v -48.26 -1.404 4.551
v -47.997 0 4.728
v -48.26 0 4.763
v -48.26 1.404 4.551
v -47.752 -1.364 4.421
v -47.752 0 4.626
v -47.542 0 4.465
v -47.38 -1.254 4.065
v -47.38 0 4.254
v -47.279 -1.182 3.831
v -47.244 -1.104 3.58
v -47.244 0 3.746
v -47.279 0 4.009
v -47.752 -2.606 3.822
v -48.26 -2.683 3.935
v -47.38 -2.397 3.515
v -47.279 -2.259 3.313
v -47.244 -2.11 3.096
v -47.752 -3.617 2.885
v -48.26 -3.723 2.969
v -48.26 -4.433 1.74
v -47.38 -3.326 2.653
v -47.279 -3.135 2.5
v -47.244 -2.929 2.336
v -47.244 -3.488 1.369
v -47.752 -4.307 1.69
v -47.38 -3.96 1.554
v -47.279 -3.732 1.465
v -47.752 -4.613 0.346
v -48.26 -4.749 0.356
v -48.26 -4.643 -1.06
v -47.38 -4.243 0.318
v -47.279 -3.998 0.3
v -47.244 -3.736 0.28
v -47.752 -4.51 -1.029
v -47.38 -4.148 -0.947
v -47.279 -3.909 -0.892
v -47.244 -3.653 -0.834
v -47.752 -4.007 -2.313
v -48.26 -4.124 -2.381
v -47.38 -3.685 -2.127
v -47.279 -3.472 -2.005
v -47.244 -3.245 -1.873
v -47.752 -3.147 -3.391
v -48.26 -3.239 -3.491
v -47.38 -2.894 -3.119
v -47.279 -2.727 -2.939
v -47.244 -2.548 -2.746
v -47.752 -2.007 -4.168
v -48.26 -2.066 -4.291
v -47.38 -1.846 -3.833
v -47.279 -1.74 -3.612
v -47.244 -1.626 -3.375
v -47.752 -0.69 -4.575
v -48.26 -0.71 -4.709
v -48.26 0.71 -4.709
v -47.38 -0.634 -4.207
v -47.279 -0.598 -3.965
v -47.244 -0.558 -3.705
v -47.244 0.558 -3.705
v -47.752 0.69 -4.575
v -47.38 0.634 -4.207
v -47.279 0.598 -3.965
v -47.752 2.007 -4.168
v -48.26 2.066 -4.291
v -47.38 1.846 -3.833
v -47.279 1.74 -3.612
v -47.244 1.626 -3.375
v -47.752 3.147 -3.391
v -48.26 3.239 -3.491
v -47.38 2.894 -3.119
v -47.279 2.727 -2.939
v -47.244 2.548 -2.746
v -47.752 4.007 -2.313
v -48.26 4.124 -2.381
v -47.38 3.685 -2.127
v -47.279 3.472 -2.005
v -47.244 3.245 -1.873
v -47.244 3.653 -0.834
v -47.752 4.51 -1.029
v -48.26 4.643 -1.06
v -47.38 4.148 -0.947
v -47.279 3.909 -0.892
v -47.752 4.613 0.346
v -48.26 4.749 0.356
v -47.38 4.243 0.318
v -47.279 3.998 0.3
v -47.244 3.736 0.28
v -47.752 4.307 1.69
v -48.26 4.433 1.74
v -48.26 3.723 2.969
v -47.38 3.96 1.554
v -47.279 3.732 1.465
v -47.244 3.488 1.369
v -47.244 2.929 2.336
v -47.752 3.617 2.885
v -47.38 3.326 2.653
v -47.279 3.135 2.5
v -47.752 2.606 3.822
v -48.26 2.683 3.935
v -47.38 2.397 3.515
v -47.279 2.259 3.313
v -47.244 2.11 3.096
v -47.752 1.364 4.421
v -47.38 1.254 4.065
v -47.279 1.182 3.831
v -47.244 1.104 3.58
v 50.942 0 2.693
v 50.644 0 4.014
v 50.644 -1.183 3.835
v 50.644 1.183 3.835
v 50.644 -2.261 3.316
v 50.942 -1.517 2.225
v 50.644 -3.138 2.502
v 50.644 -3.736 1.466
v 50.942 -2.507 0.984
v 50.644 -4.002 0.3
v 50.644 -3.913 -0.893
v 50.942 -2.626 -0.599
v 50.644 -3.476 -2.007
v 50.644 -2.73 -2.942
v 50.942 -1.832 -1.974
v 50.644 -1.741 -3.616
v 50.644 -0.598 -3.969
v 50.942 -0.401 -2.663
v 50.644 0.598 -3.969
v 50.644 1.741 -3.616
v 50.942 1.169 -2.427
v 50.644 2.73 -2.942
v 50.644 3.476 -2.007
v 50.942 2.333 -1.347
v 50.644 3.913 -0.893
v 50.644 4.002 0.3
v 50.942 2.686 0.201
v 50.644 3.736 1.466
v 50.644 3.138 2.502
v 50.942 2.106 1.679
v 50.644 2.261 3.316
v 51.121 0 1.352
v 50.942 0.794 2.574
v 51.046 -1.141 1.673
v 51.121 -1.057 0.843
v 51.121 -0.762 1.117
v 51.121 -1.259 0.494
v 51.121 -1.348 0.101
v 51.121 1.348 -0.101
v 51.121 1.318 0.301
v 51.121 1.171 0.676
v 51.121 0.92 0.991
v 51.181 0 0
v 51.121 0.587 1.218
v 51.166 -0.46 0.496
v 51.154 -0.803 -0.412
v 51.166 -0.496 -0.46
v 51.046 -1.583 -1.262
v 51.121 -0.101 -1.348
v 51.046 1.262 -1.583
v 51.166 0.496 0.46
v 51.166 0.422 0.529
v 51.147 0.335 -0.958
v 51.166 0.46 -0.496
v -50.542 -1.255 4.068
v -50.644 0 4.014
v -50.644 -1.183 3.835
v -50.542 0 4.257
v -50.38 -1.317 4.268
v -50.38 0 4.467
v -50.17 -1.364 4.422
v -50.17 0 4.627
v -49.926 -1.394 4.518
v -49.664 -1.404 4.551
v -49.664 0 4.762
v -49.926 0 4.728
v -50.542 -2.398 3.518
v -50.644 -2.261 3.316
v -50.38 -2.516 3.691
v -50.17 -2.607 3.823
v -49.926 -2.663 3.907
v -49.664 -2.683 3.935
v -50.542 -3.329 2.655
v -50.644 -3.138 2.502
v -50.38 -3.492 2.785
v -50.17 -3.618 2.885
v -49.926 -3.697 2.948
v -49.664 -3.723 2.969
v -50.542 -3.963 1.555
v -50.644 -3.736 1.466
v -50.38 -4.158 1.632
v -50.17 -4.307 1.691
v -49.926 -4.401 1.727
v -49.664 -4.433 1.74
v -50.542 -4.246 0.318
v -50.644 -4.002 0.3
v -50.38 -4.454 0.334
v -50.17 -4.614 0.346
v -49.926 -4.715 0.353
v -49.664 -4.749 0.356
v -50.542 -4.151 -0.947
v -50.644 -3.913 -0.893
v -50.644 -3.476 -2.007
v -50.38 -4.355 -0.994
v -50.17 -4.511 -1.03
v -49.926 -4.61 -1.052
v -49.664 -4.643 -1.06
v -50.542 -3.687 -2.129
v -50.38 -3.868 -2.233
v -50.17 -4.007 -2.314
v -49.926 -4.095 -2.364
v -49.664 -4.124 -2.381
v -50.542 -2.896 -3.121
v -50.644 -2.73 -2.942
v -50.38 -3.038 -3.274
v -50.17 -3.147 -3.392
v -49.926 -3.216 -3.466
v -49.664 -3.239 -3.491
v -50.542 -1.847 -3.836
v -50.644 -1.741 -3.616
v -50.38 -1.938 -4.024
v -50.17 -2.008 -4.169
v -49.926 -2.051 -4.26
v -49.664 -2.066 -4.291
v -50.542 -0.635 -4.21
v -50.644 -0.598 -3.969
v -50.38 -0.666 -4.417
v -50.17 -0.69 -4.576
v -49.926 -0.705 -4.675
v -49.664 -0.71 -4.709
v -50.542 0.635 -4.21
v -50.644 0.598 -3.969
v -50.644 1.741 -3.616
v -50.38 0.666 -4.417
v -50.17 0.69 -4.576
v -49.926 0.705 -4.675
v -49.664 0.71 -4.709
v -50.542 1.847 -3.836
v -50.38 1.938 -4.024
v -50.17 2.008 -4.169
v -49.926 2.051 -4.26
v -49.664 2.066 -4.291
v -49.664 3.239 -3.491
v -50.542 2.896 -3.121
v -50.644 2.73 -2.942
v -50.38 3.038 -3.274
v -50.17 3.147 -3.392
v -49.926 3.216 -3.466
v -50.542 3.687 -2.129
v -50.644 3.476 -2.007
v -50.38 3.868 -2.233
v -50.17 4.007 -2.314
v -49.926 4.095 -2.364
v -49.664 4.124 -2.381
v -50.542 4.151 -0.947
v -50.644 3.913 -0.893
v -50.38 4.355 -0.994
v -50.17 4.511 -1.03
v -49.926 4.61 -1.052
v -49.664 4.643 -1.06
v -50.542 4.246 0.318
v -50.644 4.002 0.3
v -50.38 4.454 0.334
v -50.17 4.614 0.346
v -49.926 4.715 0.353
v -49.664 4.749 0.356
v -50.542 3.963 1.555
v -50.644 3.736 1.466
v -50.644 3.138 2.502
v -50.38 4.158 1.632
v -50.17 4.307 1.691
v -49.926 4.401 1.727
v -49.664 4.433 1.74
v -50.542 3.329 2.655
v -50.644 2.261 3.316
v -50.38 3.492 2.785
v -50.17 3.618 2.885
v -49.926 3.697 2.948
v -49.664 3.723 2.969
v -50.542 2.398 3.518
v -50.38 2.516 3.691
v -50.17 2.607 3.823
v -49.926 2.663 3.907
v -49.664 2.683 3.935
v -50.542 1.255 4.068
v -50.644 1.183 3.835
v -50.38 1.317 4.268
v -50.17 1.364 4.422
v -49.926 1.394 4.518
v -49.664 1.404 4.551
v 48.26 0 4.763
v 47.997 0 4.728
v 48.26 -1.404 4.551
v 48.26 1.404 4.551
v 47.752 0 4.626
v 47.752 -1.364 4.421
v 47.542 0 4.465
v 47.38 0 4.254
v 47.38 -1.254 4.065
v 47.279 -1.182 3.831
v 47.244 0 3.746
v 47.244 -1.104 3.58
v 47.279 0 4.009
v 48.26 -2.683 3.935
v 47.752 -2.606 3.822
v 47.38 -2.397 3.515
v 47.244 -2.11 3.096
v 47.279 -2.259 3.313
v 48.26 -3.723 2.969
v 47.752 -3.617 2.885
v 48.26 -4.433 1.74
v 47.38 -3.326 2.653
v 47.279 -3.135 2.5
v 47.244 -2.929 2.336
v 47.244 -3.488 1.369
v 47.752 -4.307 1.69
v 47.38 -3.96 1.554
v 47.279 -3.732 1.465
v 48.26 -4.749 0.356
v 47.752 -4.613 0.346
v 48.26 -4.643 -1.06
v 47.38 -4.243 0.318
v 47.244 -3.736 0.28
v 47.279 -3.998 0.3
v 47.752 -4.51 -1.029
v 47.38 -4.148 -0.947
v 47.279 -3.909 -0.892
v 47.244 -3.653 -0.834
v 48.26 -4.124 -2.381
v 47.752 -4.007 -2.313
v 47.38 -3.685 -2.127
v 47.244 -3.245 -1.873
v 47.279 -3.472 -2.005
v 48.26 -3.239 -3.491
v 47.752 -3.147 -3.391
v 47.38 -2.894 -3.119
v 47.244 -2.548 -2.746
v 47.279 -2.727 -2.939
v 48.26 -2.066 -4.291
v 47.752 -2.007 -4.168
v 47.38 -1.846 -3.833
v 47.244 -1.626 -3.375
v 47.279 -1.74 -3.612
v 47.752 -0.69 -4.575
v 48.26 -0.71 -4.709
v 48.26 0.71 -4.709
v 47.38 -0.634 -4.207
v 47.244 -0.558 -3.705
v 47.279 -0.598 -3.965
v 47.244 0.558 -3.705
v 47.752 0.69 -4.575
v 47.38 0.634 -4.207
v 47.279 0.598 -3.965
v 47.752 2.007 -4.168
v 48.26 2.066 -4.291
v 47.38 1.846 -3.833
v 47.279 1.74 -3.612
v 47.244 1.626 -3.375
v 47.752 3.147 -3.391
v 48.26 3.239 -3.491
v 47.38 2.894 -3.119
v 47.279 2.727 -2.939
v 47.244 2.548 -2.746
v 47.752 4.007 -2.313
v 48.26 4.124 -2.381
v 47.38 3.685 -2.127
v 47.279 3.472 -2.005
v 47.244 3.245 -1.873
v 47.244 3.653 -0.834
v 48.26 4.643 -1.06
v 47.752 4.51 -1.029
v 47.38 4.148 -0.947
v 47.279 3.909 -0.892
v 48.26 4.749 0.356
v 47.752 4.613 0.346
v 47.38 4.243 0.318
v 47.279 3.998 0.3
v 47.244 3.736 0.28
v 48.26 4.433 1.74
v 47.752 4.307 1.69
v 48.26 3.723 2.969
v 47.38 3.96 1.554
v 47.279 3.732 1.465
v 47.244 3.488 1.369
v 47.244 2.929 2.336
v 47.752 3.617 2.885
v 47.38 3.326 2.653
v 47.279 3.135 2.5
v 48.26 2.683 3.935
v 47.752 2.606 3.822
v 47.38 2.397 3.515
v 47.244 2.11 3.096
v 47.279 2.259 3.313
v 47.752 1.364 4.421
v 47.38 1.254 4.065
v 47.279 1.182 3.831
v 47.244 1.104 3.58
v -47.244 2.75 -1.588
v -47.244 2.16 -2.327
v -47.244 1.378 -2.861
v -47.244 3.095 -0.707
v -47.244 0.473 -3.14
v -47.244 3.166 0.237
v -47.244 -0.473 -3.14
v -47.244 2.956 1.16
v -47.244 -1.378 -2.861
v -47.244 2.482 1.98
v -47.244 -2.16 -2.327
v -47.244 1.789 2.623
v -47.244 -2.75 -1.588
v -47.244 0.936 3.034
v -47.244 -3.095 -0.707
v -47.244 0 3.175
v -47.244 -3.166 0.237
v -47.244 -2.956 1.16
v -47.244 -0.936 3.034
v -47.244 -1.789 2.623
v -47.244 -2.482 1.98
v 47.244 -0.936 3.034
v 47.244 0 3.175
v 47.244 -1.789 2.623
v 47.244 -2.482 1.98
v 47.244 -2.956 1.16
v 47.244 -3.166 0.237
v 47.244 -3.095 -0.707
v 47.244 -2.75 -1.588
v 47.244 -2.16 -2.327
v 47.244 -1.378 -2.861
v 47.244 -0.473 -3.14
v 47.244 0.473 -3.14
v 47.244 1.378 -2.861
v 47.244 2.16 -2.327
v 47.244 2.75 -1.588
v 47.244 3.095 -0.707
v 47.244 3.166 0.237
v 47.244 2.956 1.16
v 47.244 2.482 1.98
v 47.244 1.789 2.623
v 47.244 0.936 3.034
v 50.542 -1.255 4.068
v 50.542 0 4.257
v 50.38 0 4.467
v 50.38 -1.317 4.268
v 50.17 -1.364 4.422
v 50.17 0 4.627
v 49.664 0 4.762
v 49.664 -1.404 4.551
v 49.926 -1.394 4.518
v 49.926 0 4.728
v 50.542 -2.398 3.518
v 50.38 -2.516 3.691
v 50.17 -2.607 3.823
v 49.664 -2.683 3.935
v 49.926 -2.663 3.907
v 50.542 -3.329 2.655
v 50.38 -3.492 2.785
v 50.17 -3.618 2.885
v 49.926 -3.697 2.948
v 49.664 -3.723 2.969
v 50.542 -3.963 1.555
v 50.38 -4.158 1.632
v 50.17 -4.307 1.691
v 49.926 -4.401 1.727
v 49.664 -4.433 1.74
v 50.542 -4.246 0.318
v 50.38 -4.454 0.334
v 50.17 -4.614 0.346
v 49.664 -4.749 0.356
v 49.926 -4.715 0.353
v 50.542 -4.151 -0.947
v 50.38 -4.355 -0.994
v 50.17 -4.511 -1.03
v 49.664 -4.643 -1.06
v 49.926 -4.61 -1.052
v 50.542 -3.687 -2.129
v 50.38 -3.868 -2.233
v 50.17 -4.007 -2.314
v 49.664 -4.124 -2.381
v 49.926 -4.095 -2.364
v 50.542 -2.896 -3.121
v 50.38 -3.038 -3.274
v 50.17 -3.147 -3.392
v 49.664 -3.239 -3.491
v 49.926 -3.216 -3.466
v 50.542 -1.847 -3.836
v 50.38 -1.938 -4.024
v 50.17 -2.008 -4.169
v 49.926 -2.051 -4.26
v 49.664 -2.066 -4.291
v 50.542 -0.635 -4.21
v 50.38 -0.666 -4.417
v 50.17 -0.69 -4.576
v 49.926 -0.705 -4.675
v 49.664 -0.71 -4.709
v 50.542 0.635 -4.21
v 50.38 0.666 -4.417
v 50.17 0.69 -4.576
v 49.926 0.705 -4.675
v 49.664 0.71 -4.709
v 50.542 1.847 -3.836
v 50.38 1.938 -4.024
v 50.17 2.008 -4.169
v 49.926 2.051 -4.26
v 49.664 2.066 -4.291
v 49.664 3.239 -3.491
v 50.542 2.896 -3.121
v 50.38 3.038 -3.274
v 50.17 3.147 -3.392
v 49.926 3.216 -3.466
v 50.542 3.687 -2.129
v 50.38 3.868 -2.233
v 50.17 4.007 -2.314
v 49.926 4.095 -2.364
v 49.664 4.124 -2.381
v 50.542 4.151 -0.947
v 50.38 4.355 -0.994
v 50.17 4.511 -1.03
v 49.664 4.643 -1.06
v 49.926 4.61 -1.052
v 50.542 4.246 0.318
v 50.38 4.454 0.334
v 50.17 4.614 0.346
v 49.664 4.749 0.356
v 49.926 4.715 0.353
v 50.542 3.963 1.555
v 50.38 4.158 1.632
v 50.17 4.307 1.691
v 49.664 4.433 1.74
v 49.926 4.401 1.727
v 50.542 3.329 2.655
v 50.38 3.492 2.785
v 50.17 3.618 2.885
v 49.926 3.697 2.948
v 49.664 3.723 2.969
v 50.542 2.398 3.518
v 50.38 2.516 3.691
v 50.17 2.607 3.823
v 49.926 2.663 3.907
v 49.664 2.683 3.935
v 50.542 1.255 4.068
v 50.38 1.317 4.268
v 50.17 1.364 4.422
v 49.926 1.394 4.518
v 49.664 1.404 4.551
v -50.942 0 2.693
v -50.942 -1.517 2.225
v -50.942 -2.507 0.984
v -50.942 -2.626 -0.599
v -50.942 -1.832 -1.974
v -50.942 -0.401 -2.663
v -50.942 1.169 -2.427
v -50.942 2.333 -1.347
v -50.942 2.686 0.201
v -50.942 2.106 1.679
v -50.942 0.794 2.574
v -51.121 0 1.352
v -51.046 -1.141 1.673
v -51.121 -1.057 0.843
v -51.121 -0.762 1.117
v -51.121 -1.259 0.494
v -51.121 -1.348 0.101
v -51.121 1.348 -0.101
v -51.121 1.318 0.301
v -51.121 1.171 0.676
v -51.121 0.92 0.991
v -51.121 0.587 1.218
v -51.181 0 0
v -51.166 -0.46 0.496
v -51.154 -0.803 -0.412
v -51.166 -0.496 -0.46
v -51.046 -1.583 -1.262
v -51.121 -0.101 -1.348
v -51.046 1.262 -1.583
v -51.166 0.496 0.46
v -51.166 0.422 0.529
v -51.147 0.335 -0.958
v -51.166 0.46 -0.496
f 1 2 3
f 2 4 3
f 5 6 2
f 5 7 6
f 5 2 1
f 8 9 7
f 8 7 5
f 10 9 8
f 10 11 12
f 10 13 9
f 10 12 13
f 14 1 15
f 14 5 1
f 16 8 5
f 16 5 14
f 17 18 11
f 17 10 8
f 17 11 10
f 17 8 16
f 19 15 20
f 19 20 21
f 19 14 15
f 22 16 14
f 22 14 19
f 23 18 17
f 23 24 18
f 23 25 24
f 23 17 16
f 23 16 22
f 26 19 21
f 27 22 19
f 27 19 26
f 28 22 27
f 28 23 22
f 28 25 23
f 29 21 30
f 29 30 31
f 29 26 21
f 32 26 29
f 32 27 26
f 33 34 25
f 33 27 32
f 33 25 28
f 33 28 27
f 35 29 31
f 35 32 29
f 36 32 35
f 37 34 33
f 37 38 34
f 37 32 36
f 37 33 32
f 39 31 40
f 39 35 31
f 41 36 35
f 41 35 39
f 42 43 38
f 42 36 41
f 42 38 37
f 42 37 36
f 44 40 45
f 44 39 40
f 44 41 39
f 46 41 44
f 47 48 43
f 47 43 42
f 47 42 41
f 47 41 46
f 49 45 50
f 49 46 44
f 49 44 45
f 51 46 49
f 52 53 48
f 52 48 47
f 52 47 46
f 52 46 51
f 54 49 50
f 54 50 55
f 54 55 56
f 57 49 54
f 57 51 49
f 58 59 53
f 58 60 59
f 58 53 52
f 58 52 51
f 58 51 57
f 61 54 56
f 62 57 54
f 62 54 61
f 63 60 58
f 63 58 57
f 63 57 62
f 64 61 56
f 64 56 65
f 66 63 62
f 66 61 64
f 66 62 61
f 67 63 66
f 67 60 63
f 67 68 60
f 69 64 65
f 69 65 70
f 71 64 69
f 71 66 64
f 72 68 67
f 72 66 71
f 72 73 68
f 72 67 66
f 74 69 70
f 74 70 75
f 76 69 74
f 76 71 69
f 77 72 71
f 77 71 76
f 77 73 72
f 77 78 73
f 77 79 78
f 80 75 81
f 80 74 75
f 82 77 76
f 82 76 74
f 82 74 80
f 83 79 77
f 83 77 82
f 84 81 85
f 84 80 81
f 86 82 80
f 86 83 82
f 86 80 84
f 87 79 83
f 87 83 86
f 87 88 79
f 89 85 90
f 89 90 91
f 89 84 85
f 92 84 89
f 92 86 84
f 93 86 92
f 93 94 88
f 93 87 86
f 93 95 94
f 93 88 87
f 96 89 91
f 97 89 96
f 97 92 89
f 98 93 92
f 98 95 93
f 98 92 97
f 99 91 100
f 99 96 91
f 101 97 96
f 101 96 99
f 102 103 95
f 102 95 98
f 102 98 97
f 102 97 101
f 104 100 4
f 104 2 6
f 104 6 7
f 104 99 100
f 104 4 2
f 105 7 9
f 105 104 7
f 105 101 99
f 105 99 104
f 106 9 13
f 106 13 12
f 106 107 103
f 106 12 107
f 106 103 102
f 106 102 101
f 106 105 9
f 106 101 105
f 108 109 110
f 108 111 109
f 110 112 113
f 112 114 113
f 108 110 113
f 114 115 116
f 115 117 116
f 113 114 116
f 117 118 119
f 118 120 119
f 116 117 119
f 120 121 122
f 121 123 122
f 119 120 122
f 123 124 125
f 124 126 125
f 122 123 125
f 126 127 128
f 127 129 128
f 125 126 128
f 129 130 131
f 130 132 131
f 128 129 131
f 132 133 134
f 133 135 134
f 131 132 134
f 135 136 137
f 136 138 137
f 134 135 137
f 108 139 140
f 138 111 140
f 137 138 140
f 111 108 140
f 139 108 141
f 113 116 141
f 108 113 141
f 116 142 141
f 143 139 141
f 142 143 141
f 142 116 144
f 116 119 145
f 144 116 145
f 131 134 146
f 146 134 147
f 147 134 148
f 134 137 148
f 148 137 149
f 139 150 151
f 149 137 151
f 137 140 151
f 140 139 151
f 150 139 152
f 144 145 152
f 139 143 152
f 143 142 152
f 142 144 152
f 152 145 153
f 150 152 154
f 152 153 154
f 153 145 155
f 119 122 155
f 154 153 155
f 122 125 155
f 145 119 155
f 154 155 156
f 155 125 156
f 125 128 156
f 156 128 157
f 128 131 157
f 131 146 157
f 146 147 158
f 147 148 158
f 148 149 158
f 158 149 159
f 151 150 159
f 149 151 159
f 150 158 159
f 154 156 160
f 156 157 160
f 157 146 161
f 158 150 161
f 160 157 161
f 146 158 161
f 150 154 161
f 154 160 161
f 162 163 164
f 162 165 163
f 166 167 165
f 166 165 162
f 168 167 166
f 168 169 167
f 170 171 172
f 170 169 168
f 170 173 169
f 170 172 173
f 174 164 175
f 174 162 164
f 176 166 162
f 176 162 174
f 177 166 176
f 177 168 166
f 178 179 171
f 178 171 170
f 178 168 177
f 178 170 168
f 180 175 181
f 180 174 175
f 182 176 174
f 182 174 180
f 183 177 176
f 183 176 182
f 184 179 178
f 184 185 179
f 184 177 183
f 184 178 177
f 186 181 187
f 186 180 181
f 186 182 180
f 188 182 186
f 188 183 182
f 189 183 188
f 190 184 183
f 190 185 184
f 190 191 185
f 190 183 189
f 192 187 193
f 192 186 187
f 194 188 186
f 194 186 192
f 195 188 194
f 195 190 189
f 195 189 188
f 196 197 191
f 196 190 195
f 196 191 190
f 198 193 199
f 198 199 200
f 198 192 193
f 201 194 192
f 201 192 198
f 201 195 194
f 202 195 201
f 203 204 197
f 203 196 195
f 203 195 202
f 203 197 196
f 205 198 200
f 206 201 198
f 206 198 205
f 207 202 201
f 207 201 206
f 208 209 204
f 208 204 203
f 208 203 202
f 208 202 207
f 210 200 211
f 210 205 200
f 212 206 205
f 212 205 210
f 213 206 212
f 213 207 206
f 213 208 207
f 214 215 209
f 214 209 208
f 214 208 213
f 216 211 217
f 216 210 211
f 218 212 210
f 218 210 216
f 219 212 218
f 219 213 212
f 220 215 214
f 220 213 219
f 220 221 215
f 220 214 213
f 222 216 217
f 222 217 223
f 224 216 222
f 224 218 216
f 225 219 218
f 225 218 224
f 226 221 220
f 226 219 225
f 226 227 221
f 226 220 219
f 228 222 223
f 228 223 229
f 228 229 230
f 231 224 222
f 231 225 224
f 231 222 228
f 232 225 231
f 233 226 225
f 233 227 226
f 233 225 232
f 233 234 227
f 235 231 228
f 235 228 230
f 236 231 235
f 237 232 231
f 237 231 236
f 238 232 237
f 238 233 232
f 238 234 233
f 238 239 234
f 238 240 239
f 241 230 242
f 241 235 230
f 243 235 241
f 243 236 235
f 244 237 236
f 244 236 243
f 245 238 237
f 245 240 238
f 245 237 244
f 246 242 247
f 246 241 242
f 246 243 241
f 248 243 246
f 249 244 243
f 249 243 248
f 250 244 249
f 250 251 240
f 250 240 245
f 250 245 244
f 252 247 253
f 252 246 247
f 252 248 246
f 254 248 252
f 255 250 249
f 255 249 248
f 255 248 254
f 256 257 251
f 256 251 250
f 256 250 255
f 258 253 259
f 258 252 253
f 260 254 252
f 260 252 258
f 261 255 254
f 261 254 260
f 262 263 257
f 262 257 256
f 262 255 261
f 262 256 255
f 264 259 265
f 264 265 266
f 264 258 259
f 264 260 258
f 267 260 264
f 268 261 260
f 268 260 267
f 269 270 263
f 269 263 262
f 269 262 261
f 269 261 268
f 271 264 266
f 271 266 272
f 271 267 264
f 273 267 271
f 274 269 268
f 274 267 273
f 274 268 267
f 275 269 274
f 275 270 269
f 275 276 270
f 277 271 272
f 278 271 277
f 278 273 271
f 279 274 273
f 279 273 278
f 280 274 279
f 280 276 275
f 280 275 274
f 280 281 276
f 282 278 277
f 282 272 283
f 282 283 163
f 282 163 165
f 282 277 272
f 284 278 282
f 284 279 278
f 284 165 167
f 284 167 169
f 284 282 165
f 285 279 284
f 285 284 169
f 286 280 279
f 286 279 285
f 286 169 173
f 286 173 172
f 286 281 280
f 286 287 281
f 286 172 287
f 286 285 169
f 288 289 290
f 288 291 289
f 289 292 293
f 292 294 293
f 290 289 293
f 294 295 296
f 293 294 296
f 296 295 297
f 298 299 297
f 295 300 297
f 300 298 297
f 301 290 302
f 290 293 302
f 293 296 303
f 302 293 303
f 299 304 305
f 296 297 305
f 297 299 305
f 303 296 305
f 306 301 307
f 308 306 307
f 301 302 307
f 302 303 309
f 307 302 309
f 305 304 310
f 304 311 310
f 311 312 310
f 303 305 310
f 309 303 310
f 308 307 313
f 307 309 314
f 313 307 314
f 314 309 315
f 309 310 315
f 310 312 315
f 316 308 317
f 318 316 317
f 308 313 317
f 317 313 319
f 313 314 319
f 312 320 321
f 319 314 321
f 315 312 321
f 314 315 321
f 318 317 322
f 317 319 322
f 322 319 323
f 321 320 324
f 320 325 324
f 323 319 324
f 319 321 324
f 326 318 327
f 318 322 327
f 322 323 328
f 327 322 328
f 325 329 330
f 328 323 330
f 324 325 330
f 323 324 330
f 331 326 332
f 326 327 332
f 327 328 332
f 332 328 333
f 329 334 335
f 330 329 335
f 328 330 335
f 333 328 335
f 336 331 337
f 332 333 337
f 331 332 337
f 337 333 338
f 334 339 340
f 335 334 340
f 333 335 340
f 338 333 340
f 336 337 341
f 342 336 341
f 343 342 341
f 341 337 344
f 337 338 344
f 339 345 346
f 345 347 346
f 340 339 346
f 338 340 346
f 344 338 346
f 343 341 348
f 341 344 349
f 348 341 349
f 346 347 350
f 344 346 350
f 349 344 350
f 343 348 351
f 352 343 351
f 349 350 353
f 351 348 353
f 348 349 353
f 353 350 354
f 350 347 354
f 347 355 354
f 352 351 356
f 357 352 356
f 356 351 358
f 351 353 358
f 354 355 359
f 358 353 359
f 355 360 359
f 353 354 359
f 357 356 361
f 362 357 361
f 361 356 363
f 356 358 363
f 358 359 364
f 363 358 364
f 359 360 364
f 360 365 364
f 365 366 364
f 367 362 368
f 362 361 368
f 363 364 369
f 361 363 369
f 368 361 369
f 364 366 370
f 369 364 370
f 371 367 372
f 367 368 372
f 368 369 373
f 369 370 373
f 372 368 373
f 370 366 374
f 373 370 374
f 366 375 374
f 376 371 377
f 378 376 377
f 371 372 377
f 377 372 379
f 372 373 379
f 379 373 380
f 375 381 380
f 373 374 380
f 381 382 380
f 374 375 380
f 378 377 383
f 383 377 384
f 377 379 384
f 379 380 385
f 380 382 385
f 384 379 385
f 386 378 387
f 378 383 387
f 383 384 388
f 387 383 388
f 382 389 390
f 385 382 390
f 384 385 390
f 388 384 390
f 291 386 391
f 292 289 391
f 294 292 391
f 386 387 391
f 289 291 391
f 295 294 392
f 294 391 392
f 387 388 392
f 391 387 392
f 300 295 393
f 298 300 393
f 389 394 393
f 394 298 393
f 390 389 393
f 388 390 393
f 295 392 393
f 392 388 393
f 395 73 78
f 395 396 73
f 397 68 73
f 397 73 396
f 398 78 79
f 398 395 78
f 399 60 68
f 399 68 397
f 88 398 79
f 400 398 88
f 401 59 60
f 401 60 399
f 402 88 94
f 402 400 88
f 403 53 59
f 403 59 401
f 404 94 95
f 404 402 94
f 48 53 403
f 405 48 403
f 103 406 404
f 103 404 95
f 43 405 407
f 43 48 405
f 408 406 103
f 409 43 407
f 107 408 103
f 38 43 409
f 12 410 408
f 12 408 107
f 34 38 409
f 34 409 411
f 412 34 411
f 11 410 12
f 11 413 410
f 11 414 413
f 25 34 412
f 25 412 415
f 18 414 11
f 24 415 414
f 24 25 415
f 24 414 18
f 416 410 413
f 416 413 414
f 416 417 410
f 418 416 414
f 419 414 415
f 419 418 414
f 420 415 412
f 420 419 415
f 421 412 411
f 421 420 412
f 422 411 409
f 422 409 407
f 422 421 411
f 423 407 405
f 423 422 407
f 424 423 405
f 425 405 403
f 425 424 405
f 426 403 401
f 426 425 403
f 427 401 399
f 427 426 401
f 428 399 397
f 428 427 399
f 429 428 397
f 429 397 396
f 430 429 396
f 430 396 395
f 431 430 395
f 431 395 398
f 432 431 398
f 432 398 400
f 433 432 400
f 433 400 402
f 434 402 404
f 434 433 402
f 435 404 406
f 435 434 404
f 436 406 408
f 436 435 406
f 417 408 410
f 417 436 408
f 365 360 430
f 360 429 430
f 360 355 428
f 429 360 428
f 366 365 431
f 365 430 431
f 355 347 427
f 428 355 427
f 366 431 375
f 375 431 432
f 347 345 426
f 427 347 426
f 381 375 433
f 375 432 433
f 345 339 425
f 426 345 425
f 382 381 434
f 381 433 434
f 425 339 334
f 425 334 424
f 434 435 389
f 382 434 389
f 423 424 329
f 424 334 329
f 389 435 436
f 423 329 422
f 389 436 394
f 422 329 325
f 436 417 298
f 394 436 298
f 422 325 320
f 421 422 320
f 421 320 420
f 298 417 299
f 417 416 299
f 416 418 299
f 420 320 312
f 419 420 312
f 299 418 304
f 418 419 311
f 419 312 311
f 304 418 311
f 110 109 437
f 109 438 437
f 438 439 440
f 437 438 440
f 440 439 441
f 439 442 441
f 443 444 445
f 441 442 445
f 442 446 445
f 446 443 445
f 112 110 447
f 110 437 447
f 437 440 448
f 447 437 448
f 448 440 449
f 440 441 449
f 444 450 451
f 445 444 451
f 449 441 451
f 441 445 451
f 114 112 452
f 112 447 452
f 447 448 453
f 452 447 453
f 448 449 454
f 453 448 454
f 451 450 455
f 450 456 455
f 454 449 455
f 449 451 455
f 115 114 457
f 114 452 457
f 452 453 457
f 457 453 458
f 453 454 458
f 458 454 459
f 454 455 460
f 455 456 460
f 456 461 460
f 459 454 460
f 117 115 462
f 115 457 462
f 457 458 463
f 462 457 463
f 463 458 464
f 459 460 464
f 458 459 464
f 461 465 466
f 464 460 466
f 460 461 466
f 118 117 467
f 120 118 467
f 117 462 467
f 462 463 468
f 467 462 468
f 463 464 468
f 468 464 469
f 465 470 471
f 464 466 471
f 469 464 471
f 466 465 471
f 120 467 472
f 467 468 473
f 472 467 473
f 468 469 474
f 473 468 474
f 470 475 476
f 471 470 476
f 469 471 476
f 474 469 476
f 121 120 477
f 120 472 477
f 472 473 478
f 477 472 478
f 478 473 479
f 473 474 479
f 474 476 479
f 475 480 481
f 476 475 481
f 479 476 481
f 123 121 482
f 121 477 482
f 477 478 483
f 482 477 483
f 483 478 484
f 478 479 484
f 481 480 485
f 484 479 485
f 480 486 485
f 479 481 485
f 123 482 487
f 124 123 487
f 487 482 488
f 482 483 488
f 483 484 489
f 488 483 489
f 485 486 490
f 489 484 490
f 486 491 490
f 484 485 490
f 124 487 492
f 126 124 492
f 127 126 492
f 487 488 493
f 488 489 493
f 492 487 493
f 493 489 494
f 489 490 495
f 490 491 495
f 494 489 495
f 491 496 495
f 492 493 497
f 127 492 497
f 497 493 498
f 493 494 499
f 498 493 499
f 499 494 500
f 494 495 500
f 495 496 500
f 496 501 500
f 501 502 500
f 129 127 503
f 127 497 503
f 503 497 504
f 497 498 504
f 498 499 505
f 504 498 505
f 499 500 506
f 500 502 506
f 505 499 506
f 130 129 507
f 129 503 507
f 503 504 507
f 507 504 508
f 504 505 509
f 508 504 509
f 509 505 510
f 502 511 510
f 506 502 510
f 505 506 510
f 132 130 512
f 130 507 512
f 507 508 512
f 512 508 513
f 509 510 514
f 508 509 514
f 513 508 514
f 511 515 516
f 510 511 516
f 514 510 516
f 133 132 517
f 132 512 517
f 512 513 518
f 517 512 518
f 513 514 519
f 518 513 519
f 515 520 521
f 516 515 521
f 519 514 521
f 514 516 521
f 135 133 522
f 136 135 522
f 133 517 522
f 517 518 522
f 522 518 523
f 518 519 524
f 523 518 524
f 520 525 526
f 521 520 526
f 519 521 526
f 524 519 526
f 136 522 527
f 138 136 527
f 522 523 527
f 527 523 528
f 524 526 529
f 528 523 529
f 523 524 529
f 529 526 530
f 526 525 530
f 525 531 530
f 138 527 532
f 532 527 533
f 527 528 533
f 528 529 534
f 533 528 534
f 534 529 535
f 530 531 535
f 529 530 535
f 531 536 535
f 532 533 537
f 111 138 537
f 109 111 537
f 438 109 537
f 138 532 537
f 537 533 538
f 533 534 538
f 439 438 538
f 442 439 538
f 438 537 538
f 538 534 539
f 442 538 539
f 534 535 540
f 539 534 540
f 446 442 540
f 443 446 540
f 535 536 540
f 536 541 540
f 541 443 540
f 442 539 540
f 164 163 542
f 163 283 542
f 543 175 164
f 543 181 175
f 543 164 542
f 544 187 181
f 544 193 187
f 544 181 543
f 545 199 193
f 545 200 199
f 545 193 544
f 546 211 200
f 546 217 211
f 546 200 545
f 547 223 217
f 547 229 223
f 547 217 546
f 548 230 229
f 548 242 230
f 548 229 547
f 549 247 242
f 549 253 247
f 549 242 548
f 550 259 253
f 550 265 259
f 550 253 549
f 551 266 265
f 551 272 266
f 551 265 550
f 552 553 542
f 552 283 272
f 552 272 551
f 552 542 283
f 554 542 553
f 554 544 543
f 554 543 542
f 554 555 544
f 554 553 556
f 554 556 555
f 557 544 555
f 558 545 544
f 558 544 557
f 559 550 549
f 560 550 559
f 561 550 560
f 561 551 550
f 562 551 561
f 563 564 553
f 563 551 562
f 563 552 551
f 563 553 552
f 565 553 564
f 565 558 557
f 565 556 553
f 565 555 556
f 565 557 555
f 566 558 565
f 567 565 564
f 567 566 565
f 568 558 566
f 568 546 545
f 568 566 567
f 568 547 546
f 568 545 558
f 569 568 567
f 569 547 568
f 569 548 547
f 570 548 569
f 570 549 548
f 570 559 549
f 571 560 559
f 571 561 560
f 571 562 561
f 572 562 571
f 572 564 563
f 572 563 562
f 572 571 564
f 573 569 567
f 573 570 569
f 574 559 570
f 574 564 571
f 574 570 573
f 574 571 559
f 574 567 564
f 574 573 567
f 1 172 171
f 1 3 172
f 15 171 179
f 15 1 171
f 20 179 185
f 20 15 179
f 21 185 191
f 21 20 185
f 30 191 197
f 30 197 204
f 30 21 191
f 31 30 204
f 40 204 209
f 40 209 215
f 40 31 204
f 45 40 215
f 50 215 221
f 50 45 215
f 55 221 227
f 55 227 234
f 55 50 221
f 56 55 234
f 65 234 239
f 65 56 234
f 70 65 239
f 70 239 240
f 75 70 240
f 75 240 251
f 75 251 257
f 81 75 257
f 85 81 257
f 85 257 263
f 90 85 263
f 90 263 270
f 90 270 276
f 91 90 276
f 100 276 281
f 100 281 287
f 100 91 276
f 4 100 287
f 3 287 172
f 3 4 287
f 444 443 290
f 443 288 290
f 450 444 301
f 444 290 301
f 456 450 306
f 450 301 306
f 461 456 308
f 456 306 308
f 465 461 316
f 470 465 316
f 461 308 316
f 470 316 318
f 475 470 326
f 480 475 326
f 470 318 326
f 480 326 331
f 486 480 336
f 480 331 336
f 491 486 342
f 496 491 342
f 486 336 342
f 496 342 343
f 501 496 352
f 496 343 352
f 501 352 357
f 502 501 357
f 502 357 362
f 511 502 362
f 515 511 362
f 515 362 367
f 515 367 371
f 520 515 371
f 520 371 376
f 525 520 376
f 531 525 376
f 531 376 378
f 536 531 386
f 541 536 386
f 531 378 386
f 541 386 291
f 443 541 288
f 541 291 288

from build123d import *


with BuildPart() as f1:
    # F0 (on Front) → F1 (revolve)
    with BuildSketch(Plane.XZ):
        with BuildLine():
            Line((0, 3.175), (0, 0))
            Line((0, 0), (51.181, 0))
            ThreePointArc((51.181, 0), (51.046133, 2.024703), (50.643913, 4.01363))
            ThreePointArc((50.643913, 4.01363), (50.280446, 4.55386), (49.663659, 4.7625))
            Line((49.663659, 4.7625), (48.26, 4.7625))
            ThreePointArc((48.26, 4.7625), (47.54158, 4.46492), (47.244, 3.7465))
            Line((47.244, 3.7465), (47.244, 3.175))
            Line((47.244, 3.175), (0, 3.175))
        make_face()
    revolve(axis=Axis((25.5905, 0, 0), (1, 0, 0)))

    # F2: F1 across plane


with BuildPart() as f1_1:
    add(f1.part)
    add(f1.part.mirror(Plane.YZ))


solid = f1_1.part
